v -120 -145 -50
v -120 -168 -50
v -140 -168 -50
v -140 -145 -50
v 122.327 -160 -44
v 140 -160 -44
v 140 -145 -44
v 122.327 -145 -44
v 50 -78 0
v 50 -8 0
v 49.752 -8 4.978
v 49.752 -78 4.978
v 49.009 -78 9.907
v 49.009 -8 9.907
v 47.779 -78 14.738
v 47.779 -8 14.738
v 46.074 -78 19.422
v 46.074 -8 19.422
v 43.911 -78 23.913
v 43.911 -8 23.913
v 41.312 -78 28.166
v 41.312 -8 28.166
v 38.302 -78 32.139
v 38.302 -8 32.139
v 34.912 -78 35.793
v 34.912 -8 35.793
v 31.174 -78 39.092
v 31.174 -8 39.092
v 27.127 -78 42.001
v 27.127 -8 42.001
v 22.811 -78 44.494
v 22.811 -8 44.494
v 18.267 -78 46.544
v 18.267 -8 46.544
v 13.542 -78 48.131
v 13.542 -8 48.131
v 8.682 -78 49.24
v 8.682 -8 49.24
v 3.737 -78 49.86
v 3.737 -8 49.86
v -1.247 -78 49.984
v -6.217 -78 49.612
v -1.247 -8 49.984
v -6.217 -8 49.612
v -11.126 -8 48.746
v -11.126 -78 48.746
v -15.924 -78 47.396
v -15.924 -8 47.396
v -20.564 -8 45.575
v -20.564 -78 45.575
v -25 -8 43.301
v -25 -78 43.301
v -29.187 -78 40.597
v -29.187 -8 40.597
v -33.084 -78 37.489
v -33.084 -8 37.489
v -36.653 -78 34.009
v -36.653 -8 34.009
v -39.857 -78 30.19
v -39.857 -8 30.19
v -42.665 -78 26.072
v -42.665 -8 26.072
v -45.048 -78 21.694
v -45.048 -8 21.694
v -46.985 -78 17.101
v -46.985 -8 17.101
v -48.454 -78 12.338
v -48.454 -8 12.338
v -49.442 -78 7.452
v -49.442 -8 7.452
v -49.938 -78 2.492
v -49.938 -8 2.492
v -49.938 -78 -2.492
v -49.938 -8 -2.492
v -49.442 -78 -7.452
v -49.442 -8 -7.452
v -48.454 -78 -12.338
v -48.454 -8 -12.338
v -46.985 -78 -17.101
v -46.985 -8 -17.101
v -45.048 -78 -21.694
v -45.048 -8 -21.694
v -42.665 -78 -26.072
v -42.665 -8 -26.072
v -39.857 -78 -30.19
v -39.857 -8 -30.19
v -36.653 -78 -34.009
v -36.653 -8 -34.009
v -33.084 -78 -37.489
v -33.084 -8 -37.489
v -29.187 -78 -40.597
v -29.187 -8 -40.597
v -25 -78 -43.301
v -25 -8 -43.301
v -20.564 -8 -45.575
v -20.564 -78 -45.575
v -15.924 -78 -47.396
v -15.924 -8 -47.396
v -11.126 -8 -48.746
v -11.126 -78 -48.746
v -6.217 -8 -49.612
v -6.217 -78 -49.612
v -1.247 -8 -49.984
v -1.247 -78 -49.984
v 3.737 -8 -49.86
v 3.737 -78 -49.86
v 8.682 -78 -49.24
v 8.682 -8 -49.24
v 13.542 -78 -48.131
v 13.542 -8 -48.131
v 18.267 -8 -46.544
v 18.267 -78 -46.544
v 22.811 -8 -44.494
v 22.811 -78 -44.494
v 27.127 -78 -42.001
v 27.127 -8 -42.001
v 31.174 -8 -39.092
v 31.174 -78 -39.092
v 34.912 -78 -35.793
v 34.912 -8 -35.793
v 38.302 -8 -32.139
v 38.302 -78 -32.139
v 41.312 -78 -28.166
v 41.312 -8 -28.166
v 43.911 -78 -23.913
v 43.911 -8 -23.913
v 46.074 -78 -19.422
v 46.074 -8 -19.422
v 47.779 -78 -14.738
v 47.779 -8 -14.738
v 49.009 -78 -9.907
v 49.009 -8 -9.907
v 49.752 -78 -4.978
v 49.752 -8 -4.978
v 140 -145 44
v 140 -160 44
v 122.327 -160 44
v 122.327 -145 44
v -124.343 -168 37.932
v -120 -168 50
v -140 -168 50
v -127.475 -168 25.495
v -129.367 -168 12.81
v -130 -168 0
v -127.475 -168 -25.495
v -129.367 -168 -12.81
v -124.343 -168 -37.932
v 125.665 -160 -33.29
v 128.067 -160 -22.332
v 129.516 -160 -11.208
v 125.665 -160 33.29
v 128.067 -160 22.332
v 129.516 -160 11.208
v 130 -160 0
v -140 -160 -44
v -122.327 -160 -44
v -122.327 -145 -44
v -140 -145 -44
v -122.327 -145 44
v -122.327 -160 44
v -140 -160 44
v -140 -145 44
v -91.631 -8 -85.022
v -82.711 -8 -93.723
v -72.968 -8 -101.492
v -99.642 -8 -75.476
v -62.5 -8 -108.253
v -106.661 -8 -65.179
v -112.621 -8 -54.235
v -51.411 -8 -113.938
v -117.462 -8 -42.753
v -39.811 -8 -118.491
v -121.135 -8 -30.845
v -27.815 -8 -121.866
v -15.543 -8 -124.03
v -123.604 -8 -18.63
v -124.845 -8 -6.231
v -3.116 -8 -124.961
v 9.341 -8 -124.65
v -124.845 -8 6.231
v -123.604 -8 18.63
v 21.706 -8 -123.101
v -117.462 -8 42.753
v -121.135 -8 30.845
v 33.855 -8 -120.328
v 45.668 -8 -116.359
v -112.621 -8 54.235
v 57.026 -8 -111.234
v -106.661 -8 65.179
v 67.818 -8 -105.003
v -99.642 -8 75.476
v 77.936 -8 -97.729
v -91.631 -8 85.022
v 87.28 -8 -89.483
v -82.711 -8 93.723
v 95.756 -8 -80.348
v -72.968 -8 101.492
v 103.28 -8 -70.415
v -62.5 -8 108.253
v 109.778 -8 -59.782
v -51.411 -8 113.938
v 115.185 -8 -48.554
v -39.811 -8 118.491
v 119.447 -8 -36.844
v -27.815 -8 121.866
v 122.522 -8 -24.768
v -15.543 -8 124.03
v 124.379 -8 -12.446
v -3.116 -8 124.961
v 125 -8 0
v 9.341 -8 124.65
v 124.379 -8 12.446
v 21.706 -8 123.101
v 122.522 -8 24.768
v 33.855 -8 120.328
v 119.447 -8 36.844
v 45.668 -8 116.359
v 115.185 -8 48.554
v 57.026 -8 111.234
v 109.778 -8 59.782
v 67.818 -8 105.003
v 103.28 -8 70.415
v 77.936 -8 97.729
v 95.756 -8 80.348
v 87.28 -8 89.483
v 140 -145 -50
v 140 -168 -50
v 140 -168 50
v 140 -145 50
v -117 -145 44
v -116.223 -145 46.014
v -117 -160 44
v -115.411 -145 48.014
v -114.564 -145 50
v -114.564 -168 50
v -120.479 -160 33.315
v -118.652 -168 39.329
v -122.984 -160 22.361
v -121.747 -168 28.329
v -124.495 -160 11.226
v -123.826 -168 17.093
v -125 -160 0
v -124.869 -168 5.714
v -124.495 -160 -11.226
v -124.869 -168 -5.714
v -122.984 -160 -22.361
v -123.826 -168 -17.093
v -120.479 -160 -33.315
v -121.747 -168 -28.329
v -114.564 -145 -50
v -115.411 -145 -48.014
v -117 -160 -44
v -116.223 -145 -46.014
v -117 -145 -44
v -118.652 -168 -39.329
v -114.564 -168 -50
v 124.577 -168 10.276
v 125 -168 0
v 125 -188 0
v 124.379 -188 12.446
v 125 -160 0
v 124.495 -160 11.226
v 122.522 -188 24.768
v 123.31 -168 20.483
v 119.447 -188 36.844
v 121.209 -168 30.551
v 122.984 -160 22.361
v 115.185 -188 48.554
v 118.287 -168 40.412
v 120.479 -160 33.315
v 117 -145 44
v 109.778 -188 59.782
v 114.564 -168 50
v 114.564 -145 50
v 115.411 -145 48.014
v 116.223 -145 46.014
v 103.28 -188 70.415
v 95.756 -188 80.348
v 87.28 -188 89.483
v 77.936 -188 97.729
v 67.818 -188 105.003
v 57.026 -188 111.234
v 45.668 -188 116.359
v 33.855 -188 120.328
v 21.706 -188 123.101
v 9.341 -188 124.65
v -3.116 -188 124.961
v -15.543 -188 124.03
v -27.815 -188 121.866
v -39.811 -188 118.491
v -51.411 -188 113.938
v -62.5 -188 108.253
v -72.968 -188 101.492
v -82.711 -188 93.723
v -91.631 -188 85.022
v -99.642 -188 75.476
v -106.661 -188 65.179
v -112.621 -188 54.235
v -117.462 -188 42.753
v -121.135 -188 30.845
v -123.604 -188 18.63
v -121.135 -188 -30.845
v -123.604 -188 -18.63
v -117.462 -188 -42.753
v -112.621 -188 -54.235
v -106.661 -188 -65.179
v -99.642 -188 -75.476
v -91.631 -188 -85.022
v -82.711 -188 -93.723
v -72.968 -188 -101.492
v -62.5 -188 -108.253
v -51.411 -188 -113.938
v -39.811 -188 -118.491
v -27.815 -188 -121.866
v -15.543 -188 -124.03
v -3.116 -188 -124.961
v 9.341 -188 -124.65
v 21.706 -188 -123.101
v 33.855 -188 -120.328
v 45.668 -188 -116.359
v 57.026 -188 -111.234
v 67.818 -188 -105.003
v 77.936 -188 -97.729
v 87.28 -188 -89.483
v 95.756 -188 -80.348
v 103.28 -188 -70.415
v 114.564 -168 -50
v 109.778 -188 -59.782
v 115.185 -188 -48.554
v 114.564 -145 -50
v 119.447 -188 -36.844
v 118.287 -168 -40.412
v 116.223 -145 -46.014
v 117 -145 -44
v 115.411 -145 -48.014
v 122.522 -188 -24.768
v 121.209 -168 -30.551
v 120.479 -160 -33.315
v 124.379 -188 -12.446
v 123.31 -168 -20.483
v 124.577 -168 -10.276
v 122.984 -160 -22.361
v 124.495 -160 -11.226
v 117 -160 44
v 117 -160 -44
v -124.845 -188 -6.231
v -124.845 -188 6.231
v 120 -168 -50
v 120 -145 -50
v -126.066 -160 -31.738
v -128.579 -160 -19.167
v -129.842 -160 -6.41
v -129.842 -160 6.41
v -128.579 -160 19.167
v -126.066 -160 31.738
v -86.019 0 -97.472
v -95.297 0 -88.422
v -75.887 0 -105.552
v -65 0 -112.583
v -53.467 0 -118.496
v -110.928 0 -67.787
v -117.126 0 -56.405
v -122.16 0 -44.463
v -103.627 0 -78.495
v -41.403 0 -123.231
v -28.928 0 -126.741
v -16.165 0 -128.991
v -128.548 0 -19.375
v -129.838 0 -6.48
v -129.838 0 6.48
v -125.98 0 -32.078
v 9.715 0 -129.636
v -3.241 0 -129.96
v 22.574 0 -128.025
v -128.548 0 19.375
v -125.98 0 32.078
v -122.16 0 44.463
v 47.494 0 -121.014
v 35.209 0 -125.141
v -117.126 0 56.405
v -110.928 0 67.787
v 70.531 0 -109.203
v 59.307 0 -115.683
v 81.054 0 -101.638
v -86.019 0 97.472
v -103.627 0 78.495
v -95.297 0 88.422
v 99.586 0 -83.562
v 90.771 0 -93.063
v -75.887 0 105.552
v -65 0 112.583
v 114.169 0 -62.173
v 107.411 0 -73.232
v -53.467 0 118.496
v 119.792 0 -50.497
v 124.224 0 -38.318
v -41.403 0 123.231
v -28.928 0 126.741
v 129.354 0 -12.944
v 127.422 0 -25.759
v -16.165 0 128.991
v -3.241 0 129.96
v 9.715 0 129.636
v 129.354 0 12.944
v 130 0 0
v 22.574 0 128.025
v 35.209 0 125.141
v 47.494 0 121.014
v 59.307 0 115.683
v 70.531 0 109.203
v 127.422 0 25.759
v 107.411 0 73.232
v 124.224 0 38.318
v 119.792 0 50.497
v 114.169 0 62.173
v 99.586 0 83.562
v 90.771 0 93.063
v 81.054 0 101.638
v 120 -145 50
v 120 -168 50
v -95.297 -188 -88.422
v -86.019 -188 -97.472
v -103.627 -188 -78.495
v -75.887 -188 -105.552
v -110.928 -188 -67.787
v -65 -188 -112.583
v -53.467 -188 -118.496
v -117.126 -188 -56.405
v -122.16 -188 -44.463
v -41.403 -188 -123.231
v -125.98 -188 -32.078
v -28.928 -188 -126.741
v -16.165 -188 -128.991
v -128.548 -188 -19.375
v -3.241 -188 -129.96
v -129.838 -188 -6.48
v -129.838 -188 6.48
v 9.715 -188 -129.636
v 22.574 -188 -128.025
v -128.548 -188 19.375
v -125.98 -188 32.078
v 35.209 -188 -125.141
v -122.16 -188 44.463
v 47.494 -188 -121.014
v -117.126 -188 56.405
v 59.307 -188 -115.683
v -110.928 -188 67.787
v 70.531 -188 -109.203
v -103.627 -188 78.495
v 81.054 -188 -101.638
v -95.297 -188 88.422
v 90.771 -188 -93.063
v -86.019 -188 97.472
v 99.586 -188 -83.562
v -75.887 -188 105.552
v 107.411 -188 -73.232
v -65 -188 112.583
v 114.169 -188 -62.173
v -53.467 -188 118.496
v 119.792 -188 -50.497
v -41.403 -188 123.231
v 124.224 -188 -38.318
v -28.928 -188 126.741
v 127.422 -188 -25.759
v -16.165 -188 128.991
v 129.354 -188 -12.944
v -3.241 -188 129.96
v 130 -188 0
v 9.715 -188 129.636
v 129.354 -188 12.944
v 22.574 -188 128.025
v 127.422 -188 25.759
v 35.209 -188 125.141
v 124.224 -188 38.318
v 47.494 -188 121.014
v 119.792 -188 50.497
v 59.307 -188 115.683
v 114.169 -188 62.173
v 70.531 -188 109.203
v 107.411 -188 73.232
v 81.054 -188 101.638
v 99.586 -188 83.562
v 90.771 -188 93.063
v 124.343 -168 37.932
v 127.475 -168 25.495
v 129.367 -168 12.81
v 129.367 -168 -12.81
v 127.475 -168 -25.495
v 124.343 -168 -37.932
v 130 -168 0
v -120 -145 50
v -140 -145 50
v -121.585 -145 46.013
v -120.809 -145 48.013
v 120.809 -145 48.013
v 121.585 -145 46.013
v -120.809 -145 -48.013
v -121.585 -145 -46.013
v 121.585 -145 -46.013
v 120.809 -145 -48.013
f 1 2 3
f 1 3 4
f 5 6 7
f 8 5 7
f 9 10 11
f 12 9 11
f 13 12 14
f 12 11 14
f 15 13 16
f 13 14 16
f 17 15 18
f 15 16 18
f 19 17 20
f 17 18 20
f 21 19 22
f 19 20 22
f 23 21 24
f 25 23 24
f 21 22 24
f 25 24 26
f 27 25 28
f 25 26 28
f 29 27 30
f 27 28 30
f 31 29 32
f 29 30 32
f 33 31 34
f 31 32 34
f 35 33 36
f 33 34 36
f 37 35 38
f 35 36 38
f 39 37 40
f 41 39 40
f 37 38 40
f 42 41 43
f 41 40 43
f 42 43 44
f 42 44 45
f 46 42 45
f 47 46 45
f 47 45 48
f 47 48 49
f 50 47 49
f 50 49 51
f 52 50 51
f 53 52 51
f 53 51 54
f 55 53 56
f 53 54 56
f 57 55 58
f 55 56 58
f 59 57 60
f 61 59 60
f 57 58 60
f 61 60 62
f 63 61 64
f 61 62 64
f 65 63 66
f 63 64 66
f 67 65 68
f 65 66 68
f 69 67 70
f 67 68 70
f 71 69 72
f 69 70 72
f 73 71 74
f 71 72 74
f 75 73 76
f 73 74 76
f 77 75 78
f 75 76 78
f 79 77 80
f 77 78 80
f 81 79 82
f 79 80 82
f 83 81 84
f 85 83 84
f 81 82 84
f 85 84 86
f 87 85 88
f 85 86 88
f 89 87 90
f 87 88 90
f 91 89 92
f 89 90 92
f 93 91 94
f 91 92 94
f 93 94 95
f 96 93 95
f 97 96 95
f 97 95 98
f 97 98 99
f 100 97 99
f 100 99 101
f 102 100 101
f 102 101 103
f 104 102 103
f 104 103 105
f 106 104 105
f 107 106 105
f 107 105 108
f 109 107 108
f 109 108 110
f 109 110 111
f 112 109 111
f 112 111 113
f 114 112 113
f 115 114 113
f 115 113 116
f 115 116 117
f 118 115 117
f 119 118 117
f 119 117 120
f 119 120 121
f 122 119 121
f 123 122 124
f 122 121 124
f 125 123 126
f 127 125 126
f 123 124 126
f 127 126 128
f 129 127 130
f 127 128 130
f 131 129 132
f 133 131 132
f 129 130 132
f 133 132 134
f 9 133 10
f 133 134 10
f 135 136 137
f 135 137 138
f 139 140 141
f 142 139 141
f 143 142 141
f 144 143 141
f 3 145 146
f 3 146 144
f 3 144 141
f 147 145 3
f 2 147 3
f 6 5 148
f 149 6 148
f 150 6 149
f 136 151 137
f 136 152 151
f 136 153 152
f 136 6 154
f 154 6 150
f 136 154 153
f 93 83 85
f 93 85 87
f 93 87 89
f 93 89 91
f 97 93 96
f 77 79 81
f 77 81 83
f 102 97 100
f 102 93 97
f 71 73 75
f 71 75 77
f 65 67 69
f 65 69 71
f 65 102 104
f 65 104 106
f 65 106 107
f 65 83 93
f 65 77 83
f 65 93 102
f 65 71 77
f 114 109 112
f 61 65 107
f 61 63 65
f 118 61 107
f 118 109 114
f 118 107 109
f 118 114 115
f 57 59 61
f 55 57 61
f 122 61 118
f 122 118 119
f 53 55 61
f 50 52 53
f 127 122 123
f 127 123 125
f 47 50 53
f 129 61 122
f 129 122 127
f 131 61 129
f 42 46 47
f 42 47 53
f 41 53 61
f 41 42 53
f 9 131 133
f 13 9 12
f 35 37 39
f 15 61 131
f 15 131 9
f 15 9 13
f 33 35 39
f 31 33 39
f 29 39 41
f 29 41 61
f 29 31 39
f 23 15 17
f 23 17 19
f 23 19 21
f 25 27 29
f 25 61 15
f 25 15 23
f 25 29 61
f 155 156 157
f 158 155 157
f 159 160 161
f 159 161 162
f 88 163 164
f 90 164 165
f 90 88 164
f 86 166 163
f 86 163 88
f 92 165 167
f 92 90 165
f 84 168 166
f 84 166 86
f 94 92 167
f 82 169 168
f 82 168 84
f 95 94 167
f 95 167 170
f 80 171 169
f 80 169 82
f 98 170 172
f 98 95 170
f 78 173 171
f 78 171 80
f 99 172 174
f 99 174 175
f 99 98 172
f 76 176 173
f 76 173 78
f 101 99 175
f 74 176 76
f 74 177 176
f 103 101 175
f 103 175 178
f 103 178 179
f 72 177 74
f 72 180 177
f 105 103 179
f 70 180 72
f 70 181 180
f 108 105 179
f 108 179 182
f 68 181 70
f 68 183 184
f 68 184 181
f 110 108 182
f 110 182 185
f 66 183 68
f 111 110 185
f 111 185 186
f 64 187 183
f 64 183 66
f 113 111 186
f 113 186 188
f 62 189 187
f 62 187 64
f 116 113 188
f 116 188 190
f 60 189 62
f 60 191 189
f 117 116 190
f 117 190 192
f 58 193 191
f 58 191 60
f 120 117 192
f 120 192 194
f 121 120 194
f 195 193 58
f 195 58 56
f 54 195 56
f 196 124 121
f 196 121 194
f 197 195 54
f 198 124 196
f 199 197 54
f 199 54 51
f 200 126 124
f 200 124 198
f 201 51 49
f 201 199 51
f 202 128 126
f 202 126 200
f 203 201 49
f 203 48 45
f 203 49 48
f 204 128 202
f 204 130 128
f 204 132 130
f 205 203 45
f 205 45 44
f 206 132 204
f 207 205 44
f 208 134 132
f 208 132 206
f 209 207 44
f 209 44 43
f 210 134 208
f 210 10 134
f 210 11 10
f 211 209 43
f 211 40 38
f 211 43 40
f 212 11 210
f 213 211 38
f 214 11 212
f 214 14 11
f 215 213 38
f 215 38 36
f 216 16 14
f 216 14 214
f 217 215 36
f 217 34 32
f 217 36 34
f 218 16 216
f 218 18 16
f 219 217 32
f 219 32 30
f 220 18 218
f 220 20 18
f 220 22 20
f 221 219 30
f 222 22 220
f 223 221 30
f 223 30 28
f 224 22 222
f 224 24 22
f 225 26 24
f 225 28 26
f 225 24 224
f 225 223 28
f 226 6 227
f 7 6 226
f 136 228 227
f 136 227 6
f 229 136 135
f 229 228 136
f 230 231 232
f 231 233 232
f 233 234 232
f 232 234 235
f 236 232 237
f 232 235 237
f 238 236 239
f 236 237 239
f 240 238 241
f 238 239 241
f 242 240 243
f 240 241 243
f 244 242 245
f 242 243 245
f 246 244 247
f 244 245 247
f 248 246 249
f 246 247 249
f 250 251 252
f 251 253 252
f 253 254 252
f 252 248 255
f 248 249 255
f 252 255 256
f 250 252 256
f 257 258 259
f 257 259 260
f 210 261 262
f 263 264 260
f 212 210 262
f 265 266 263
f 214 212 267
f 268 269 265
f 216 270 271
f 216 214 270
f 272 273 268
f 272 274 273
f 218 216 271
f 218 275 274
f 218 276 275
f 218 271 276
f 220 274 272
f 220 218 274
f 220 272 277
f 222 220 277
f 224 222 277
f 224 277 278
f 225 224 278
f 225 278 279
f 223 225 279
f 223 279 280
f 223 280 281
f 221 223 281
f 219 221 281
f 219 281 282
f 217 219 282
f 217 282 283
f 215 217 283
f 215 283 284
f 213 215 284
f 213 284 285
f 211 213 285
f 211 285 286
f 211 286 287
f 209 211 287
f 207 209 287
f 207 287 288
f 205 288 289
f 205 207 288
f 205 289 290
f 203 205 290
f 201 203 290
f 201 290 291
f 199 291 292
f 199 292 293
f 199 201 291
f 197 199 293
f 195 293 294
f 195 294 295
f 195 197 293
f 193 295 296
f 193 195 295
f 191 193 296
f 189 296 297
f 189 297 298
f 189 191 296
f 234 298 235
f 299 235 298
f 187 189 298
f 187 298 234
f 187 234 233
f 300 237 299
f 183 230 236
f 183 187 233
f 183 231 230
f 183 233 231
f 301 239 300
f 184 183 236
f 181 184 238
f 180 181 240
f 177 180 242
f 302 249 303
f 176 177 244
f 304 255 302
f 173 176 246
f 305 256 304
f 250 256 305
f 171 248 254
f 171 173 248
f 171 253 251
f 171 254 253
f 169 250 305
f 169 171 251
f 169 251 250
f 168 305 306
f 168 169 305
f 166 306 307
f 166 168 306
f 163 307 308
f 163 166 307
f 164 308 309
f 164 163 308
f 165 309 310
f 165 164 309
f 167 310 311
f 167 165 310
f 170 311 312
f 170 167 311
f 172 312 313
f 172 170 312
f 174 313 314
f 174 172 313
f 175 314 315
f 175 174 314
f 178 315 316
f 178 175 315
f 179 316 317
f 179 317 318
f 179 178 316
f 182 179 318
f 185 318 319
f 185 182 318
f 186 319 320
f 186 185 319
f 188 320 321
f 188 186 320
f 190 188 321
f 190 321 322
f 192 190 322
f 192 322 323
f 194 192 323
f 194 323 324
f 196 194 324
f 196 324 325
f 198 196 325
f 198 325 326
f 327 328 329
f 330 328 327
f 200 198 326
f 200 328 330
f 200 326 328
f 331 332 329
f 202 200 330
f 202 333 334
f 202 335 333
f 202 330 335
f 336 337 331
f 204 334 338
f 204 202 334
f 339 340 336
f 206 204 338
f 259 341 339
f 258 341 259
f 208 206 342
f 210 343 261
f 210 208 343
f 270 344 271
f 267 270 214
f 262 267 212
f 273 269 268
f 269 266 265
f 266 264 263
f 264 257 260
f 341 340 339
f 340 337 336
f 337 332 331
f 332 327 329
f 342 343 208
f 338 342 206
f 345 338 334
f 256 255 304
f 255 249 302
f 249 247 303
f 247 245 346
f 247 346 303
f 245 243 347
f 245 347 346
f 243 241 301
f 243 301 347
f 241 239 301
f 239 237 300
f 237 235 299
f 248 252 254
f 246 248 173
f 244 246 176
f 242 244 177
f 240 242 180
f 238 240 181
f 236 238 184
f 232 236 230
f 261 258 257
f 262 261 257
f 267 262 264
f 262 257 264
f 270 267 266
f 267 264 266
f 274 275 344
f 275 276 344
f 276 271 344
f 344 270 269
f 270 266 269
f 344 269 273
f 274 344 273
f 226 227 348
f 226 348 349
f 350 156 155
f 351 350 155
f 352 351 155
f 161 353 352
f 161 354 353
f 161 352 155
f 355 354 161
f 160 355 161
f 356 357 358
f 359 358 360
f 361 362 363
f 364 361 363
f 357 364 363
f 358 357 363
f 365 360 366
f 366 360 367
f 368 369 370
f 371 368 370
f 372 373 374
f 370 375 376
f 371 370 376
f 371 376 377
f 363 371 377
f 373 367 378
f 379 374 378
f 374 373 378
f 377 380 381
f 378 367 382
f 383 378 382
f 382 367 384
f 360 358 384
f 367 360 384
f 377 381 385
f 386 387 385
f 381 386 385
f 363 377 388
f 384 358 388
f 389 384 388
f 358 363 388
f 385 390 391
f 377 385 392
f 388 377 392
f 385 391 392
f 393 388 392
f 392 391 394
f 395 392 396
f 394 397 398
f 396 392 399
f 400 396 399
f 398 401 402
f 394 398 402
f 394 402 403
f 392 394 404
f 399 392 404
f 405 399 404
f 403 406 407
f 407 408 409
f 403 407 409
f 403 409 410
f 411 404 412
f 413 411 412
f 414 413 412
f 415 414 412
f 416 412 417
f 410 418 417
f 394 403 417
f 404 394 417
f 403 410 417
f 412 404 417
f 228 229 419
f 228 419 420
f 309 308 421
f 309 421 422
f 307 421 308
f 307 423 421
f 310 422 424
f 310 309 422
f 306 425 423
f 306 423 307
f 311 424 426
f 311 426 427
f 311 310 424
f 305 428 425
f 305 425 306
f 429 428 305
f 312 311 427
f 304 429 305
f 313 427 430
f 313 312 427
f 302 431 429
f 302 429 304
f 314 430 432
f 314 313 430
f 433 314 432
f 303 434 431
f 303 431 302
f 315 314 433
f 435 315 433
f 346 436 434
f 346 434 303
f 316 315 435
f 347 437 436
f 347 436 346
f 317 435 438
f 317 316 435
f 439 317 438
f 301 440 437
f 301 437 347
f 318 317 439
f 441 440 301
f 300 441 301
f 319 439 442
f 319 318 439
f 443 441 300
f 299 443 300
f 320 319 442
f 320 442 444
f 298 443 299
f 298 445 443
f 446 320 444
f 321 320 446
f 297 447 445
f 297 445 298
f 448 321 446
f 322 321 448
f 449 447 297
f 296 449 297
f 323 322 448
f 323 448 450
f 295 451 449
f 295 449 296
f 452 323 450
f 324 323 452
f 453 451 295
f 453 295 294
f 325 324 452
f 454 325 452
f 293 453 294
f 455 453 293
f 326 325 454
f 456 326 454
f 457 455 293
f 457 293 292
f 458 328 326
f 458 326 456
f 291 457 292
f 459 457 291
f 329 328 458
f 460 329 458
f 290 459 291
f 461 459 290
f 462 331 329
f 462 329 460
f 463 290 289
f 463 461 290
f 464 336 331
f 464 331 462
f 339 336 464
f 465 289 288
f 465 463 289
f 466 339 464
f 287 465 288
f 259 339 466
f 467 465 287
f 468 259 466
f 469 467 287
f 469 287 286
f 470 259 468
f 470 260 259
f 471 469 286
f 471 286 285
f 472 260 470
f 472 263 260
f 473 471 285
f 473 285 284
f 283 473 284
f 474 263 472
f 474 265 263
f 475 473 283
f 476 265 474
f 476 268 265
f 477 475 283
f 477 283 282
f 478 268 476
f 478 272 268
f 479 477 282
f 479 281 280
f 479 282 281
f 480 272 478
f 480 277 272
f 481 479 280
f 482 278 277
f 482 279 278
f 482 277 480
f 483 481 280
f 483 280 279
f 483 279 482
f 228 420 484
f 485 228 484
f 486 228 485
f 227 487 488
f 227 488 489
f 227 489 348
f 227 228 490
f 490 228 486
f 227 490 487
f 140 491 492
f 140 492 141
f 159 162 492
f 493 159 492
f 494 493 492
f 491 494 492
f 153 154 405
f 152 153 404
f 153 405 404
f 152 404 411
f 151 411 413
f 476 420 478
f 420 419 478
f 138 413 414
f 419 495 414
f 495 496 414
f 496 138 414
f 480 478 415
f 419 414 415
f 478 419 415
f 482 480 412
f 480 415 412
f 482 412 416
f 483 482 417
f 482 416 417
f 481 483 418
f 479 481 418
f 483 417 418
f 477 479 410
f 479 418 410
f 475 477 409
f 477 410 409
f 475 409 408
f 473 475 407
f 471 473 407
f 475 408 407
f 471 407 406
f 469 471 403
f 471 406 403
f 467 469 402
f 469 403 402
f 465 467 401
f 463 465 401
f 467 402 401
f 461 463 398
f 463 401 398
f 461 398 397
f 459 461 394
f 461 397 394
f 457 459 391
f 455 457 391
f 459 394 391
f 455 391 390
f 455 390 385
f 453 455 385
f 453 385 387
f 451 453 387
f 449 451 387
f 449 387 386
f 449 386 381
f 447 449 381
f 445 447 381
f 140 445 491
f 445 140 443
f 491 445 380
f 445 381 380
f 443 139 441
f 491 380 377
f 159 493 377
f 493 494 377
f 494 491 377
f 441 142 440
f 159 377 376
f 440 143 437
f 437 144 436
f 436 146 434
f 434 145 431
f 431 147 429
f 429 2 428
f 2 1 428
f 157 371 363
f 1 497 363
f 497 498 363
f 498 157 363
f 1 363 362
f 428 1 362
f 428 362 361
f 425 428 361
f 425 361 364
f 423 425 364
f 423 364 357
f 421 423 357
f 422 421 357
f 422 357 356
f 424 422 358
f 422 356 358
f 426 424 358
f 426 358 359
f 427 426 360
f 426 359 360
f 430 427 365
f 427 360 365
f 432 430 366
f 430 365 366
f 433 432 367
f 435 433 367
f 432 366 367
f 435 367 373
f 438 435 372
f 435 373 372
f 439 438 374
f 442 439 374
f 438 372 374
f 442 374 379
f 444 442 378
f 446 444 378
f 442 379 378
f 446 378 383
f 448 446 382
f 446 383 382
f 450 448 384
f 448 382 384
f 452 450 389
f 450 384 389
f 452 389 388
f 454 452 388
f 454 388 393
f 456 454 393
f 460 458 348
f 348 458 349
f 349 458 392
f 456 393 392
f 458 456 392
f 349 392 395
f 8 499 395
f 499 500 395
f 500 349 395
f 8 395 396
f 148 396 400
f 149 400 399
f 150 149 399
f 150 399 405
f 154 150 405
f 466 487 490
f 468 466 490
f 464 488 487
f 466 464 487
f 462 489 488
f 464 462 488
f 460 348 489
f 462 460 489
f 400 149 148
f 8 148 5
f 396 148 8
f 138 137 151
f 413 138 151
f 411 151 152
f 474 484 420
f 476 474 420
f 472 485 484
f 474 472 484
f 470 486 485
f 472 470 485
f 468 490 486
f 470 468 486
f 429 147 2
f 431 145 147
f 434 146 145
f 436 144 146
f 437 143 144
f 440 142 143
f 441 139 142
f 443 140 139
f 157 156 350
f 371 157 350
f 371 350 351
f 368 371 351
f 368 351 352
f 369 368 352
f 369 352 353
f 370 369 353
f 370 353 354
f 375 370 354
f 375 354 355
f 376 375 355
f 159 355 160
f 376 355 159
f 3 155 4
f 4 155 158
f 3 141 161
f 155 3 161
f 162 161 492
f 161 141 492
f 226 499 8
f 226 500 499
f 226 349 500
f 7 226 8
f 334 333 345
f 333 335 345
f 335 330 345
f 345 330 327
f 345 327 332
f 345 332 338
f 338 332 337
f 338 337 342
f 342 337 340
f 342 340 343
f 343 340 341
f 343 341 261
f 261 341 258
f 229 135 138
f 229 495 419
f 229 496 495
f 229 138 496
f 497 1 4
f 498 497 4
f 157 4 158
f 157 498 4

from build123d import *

# Parameters (mm, degrees)
F0_R     = 130
F1_DEPTH = 8
F2_R     = 130
F2_R_2   = 125
F3_DEPTH = 180
F4_R     = 50
F5_DEPTH = 70
F6_W     = 15
F6_H     = 6
F7_DEPTH = 140
F8_DEPTH = 25


with BuildPart() as f1:
    # F0 (on Front) → F1 (new body)
    with BuildSketch(Plane.XZ):
        Circle(F0_R)
    extrude(amount=F1_DEPTH)

    # F2 (on face) → F3 (join)
    with BuildSketch(Plane.XZ.offset(8)):
        Circle(F2_R)
        Circle(F2_R_2, mode=Mode.SUBTRACT)
    extrude(amount=F3_DEPTH)

    # F4 (on face) → F5 (join)
    with BuildSketch(Plane.XZ.offset(8)):
        Circle(F4_R)
    extrude(amount=F5_DEPTH)

    # F6 (on Right) → F7 (join, symmetric)
    with BuildSketch(Plane.YZ):
        Polygon((-160, 50), (-168, 50), (-168, -50), (-160, -50), (-160, -44), (-160, 44), align=None)
        with Locations((-152.5, 47)):
            Rectangle(F6_W, F6_H)
        with Locations((-152.5, -47)):
            Rectangle(F6_W, F6_H)
    extrude(amount=F7_DEPTH, both=True)

    # F7_face (on face) → F8 (cut)
    with BuildSketch(Plane.XZ.offset(168)):
        with BuildLine():
            Line((114.564392, 50), (-114.564392, 50))
            ThreePointArc((-114.564392, 50), (-125, 0), (-114.564392, -50))
            Line((-114.564392, -50), (114.564392, -50))
            ThreePointArc((114.564392, -50), (122.363289, -25.538705), (125, 0))
            ThreePointArc((125, 0), (122.363289, 25.538705), (114.564392, 50))
        make_face()
    extrude(amount=-F8_DEPTH, mode=Mode.SUBTRACT)


solid = f1.part
